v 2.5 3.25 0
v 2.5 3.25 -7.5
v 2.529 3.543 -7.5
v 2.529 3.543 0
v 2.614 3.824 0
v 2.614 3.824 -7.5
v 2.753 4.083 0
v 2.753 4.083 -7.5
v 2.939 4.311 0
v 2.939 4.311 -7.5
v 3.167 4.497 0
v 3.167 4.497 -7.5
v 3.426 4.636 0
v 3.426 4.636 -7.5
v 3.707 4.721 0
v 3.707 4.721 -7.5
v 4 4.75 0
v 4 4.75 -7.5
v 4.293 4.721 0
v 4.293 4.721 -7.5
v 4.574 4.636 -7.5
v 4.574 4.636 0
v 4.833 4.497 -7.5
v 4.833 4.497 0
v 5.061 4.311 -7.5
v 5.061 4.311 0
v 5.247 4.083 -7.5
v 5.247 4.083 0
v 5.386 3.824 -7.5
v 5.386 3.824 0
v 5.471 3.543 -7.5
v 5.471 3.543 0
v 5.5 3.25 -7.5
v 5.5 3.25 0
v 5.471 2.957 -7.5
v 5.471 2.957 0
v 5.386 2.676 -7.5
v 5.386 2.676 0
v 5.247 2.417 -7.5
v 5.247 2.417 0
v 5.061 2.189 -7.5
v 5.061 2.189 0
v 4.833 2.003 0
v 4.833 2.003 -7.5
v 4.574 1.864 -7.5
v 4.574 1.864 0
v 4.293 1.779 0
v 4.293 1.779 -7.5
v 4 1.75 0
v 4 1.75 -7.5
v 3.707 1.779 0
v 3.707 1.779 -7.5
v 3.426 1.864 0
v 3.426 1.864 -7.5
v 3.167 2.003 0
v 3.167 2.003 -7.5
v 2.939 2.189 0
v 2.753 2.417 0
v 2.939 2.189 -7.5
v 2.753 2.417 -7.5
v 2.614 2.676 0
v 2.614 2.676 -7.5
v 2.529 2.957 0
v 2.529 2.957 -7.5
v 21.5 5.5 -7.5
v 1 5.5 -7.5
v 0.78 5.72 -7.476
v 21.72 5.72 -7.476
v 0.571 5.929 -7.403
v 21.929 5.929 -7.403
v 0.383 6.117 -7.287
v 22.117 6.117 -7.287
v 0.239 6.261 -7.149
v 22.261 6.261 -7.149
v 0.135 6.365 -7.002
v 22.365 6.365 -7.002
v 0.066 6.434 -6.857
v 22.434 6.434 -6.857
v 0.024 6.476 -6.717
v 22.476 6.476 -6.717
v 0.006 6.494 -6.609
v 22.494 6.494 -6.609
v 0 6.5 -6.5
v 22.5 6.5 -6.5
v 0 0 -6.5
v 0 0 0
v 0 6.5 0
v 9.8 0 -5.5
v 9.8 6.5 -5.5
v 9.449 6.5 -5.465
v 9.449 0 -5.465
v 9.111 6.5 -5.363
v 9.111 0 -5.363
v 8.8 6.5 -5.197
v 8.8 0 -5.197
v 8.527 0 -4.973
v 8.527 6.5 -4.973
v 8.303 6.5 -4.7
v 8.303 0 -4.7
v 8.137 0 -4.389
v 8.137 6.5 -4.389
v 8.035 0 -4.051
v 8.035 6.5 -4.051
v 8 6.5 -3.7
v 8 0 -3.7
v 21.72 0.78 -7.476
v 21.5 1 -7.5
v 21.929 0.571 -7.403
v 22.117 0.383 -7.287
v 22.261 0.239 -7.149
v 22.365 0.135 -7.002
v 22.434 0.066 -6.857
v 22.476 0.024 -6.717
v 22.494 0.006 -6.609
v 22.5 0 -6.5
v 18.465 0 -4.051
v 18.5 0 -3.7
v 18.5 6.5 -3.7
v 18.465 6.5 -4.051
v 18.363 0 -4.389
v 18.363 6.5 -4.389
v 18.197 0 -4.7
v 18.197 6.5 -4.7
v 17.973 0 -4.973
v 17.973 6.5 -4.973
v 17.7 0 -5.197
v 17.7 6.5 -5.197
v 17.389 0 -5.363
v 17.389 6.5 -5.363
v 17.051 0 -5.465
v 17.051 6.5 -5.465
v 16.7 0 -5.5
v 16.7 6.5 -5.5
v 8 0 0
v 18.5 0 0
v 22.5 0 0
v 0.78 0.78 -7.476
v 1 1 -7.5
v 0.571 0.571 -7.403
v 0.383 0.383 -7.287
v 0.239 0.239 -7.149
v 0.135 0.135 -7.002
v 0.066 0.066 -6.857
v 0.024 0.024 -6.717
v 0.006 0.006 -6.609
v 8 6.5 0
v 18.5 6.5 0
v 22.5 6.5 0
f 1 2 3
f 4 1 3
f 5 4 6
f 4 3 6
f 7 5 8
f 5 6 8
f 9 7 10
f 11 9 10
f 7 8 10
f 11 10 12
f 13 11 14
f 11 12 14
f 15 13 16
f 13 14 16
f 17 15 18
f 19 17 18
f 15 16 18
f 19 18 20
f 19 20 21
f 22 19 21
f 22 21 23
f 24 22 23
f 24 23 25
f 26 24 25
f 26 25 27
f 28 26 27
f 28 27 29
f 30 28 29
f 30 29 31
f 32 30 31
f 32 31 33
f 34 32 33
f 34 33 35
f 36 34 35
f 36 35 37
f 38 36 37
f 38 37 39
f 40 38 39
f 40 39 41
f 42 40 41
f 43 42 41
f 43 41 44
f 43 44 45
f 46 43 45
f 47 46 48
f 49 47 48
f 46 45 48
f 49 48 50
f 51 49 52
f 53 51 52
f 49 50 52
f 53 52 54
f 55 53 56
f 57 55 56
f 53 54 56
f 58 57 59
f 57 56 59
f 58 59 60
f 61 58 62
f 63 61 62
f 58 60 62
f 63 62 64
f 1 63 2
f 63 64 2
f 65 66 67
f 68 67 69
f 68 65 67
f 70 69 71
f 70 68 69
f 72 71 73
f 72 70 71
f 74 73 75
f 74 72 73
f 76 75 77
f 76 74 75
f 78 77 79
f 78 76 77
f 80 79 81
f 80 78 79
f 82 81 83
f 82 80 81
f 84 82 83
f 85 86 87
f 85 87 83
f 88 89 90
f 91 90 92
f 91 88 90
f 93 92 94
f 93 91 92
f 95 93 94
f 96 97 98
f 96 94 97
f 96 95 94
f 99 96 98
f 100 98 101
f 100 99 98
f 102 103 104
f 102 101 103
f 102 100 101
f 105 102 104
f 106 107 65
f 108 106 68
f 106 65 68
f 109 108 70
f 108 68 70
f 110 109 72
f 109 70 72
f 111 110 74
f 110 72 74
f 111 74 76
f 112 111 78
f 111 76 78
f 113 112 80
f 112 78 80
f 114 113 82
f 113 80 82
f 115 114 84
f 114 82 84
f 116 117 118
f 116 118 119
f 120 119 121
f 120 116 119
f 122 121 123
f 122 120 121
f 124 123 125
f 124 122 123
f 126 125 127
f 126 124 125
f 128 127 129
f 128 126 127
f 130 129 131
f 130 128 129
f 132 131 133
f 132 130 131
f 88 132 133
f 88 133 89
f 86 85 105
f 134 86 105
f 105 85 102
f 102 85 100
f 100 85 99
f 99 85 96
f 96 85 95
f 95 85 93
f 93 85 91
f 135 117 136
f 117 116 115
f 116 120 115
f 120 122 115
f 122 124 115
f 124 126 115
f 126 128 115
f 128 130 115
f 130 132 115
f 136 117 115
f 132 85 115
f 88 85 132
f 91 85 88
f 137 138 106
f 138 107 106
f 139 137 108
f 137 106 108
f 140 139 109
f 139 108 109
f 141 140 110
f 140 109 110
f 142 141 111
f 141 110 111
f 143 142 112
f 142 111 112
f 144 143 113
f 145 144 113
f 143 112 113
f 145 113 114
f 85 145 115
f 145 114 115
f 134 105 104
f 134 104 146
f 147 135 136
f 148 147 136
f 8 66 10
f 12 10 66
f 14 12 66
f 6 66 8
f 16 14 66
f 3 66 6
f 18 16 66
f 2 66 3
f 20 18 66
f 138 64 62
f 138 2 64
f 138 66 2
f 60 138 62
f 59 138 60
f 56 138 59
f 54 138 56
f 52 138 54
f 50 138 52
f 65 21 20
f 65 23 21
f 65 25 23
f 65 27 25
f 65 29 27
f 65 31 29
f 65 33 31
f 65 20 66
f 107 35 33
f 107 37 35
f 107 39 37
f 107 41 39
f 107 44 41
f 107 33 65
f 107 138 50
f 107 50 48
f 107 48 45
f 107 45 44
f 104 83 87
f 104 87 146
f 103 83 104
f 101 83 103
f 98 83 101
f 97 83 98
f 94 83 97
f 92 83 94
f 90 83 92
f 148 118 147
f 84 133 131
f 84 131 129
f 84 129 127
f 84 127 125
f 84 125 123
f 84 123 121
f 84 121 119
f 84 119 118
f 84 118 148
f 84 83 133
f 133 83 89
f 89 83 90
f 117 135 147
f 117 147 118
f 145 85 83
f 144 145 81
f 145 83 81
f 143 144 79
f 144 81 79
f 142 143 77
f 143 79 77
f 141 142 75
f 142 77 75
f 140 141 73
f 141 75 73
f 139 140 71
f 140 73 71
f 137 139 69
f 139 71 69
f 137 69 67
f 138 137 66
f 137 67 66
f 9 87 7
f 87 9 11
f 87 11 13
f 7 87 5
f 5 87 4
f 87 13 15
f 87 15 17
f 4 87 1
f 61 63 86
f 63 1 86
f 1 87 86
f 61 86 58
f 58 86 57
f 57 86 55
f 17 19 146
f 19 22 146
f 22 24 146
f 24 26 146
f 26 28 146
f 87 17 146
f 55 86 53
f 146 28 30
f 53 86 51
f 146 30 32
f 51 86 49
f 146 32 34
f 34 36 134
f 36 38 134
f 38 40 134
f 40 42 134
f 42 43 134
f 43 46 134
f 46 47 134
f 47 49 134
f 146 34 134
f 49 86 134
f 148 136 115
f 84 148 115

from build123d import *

# Parameters (mm, degrees)
SIDE_W         = 22.5
SIDE_H         = 7.5
SIDE_EX_DEPTH  = 6.5
HOLE_R         = 1.5
HOLE_CUT_DEPTH = 25.591665255
WIRE_CUT_DEPTH = 25.591665255
FILLET1_R      = 1


with BuildPart() as part:
    # Side → Side_Ex (new body)
    with BuildSketch(Plane(origin=(0, 0, 0), x_dir=(1, 0, 0), z_dir=(0, 1, 0))):
        with Locations((11.25, 3.75)):
            Rectangle(SIDE_W, SIDE_H)
    extrude(amount=SIDE_EX_DEPTH)

    # Hole → Hole_Cut (cut, through all)
    with BuildSketch(Plane(origin=(0, 0, -7.5), x_dir=(-1, 0, 0), z_dir=(0, 0, -1))):
        with Locations((-4, 3.25)):
            Circle(HOLE_R)
    extrude(amount=-HOLE_CUT_DEPTH, mode=Mode.SUBTRACT)

    # Wire 2 → Wire_Cut (cut, through all)
    with BuildSketch(Plane(origin=(0, 0, 0), x_dir=(1, 0, 0), z_dir=(0, 1, 0))):
        with BuildLine():
            Line((16.7, 5.5), (9.8, 5.5))
            ThreePointArc((9.8, 5.5), (8.527207794, 4.972792206), (8, 3.7))
            Line((8, 3.7), (8, 0))
            Line((8, 0), (18.5, 0))
            Line((18.5, 0), (18.5, 3.7))
            ThreePointArc((18.5, 3.7), (17.972792206, 4.972792206), (16.7, 5.5))
        make_face()
    extrude(amount=WIRE_CUT_DEPTH, mode=Mode.SUBTRACT)

    # Fillet1
    fillet1_edges = [part.edges().sort_by_distance(p)[0] for p in [
        (11.25, 6.5, -7.5),
        (11.25, 0, -7.5),
        (0, 3.25, -7.5),
        (22.5, 3.25, -7.5),
    ]]
    fillet(fillet1_edges, radius=FILLET1_R)


solid = part.part
